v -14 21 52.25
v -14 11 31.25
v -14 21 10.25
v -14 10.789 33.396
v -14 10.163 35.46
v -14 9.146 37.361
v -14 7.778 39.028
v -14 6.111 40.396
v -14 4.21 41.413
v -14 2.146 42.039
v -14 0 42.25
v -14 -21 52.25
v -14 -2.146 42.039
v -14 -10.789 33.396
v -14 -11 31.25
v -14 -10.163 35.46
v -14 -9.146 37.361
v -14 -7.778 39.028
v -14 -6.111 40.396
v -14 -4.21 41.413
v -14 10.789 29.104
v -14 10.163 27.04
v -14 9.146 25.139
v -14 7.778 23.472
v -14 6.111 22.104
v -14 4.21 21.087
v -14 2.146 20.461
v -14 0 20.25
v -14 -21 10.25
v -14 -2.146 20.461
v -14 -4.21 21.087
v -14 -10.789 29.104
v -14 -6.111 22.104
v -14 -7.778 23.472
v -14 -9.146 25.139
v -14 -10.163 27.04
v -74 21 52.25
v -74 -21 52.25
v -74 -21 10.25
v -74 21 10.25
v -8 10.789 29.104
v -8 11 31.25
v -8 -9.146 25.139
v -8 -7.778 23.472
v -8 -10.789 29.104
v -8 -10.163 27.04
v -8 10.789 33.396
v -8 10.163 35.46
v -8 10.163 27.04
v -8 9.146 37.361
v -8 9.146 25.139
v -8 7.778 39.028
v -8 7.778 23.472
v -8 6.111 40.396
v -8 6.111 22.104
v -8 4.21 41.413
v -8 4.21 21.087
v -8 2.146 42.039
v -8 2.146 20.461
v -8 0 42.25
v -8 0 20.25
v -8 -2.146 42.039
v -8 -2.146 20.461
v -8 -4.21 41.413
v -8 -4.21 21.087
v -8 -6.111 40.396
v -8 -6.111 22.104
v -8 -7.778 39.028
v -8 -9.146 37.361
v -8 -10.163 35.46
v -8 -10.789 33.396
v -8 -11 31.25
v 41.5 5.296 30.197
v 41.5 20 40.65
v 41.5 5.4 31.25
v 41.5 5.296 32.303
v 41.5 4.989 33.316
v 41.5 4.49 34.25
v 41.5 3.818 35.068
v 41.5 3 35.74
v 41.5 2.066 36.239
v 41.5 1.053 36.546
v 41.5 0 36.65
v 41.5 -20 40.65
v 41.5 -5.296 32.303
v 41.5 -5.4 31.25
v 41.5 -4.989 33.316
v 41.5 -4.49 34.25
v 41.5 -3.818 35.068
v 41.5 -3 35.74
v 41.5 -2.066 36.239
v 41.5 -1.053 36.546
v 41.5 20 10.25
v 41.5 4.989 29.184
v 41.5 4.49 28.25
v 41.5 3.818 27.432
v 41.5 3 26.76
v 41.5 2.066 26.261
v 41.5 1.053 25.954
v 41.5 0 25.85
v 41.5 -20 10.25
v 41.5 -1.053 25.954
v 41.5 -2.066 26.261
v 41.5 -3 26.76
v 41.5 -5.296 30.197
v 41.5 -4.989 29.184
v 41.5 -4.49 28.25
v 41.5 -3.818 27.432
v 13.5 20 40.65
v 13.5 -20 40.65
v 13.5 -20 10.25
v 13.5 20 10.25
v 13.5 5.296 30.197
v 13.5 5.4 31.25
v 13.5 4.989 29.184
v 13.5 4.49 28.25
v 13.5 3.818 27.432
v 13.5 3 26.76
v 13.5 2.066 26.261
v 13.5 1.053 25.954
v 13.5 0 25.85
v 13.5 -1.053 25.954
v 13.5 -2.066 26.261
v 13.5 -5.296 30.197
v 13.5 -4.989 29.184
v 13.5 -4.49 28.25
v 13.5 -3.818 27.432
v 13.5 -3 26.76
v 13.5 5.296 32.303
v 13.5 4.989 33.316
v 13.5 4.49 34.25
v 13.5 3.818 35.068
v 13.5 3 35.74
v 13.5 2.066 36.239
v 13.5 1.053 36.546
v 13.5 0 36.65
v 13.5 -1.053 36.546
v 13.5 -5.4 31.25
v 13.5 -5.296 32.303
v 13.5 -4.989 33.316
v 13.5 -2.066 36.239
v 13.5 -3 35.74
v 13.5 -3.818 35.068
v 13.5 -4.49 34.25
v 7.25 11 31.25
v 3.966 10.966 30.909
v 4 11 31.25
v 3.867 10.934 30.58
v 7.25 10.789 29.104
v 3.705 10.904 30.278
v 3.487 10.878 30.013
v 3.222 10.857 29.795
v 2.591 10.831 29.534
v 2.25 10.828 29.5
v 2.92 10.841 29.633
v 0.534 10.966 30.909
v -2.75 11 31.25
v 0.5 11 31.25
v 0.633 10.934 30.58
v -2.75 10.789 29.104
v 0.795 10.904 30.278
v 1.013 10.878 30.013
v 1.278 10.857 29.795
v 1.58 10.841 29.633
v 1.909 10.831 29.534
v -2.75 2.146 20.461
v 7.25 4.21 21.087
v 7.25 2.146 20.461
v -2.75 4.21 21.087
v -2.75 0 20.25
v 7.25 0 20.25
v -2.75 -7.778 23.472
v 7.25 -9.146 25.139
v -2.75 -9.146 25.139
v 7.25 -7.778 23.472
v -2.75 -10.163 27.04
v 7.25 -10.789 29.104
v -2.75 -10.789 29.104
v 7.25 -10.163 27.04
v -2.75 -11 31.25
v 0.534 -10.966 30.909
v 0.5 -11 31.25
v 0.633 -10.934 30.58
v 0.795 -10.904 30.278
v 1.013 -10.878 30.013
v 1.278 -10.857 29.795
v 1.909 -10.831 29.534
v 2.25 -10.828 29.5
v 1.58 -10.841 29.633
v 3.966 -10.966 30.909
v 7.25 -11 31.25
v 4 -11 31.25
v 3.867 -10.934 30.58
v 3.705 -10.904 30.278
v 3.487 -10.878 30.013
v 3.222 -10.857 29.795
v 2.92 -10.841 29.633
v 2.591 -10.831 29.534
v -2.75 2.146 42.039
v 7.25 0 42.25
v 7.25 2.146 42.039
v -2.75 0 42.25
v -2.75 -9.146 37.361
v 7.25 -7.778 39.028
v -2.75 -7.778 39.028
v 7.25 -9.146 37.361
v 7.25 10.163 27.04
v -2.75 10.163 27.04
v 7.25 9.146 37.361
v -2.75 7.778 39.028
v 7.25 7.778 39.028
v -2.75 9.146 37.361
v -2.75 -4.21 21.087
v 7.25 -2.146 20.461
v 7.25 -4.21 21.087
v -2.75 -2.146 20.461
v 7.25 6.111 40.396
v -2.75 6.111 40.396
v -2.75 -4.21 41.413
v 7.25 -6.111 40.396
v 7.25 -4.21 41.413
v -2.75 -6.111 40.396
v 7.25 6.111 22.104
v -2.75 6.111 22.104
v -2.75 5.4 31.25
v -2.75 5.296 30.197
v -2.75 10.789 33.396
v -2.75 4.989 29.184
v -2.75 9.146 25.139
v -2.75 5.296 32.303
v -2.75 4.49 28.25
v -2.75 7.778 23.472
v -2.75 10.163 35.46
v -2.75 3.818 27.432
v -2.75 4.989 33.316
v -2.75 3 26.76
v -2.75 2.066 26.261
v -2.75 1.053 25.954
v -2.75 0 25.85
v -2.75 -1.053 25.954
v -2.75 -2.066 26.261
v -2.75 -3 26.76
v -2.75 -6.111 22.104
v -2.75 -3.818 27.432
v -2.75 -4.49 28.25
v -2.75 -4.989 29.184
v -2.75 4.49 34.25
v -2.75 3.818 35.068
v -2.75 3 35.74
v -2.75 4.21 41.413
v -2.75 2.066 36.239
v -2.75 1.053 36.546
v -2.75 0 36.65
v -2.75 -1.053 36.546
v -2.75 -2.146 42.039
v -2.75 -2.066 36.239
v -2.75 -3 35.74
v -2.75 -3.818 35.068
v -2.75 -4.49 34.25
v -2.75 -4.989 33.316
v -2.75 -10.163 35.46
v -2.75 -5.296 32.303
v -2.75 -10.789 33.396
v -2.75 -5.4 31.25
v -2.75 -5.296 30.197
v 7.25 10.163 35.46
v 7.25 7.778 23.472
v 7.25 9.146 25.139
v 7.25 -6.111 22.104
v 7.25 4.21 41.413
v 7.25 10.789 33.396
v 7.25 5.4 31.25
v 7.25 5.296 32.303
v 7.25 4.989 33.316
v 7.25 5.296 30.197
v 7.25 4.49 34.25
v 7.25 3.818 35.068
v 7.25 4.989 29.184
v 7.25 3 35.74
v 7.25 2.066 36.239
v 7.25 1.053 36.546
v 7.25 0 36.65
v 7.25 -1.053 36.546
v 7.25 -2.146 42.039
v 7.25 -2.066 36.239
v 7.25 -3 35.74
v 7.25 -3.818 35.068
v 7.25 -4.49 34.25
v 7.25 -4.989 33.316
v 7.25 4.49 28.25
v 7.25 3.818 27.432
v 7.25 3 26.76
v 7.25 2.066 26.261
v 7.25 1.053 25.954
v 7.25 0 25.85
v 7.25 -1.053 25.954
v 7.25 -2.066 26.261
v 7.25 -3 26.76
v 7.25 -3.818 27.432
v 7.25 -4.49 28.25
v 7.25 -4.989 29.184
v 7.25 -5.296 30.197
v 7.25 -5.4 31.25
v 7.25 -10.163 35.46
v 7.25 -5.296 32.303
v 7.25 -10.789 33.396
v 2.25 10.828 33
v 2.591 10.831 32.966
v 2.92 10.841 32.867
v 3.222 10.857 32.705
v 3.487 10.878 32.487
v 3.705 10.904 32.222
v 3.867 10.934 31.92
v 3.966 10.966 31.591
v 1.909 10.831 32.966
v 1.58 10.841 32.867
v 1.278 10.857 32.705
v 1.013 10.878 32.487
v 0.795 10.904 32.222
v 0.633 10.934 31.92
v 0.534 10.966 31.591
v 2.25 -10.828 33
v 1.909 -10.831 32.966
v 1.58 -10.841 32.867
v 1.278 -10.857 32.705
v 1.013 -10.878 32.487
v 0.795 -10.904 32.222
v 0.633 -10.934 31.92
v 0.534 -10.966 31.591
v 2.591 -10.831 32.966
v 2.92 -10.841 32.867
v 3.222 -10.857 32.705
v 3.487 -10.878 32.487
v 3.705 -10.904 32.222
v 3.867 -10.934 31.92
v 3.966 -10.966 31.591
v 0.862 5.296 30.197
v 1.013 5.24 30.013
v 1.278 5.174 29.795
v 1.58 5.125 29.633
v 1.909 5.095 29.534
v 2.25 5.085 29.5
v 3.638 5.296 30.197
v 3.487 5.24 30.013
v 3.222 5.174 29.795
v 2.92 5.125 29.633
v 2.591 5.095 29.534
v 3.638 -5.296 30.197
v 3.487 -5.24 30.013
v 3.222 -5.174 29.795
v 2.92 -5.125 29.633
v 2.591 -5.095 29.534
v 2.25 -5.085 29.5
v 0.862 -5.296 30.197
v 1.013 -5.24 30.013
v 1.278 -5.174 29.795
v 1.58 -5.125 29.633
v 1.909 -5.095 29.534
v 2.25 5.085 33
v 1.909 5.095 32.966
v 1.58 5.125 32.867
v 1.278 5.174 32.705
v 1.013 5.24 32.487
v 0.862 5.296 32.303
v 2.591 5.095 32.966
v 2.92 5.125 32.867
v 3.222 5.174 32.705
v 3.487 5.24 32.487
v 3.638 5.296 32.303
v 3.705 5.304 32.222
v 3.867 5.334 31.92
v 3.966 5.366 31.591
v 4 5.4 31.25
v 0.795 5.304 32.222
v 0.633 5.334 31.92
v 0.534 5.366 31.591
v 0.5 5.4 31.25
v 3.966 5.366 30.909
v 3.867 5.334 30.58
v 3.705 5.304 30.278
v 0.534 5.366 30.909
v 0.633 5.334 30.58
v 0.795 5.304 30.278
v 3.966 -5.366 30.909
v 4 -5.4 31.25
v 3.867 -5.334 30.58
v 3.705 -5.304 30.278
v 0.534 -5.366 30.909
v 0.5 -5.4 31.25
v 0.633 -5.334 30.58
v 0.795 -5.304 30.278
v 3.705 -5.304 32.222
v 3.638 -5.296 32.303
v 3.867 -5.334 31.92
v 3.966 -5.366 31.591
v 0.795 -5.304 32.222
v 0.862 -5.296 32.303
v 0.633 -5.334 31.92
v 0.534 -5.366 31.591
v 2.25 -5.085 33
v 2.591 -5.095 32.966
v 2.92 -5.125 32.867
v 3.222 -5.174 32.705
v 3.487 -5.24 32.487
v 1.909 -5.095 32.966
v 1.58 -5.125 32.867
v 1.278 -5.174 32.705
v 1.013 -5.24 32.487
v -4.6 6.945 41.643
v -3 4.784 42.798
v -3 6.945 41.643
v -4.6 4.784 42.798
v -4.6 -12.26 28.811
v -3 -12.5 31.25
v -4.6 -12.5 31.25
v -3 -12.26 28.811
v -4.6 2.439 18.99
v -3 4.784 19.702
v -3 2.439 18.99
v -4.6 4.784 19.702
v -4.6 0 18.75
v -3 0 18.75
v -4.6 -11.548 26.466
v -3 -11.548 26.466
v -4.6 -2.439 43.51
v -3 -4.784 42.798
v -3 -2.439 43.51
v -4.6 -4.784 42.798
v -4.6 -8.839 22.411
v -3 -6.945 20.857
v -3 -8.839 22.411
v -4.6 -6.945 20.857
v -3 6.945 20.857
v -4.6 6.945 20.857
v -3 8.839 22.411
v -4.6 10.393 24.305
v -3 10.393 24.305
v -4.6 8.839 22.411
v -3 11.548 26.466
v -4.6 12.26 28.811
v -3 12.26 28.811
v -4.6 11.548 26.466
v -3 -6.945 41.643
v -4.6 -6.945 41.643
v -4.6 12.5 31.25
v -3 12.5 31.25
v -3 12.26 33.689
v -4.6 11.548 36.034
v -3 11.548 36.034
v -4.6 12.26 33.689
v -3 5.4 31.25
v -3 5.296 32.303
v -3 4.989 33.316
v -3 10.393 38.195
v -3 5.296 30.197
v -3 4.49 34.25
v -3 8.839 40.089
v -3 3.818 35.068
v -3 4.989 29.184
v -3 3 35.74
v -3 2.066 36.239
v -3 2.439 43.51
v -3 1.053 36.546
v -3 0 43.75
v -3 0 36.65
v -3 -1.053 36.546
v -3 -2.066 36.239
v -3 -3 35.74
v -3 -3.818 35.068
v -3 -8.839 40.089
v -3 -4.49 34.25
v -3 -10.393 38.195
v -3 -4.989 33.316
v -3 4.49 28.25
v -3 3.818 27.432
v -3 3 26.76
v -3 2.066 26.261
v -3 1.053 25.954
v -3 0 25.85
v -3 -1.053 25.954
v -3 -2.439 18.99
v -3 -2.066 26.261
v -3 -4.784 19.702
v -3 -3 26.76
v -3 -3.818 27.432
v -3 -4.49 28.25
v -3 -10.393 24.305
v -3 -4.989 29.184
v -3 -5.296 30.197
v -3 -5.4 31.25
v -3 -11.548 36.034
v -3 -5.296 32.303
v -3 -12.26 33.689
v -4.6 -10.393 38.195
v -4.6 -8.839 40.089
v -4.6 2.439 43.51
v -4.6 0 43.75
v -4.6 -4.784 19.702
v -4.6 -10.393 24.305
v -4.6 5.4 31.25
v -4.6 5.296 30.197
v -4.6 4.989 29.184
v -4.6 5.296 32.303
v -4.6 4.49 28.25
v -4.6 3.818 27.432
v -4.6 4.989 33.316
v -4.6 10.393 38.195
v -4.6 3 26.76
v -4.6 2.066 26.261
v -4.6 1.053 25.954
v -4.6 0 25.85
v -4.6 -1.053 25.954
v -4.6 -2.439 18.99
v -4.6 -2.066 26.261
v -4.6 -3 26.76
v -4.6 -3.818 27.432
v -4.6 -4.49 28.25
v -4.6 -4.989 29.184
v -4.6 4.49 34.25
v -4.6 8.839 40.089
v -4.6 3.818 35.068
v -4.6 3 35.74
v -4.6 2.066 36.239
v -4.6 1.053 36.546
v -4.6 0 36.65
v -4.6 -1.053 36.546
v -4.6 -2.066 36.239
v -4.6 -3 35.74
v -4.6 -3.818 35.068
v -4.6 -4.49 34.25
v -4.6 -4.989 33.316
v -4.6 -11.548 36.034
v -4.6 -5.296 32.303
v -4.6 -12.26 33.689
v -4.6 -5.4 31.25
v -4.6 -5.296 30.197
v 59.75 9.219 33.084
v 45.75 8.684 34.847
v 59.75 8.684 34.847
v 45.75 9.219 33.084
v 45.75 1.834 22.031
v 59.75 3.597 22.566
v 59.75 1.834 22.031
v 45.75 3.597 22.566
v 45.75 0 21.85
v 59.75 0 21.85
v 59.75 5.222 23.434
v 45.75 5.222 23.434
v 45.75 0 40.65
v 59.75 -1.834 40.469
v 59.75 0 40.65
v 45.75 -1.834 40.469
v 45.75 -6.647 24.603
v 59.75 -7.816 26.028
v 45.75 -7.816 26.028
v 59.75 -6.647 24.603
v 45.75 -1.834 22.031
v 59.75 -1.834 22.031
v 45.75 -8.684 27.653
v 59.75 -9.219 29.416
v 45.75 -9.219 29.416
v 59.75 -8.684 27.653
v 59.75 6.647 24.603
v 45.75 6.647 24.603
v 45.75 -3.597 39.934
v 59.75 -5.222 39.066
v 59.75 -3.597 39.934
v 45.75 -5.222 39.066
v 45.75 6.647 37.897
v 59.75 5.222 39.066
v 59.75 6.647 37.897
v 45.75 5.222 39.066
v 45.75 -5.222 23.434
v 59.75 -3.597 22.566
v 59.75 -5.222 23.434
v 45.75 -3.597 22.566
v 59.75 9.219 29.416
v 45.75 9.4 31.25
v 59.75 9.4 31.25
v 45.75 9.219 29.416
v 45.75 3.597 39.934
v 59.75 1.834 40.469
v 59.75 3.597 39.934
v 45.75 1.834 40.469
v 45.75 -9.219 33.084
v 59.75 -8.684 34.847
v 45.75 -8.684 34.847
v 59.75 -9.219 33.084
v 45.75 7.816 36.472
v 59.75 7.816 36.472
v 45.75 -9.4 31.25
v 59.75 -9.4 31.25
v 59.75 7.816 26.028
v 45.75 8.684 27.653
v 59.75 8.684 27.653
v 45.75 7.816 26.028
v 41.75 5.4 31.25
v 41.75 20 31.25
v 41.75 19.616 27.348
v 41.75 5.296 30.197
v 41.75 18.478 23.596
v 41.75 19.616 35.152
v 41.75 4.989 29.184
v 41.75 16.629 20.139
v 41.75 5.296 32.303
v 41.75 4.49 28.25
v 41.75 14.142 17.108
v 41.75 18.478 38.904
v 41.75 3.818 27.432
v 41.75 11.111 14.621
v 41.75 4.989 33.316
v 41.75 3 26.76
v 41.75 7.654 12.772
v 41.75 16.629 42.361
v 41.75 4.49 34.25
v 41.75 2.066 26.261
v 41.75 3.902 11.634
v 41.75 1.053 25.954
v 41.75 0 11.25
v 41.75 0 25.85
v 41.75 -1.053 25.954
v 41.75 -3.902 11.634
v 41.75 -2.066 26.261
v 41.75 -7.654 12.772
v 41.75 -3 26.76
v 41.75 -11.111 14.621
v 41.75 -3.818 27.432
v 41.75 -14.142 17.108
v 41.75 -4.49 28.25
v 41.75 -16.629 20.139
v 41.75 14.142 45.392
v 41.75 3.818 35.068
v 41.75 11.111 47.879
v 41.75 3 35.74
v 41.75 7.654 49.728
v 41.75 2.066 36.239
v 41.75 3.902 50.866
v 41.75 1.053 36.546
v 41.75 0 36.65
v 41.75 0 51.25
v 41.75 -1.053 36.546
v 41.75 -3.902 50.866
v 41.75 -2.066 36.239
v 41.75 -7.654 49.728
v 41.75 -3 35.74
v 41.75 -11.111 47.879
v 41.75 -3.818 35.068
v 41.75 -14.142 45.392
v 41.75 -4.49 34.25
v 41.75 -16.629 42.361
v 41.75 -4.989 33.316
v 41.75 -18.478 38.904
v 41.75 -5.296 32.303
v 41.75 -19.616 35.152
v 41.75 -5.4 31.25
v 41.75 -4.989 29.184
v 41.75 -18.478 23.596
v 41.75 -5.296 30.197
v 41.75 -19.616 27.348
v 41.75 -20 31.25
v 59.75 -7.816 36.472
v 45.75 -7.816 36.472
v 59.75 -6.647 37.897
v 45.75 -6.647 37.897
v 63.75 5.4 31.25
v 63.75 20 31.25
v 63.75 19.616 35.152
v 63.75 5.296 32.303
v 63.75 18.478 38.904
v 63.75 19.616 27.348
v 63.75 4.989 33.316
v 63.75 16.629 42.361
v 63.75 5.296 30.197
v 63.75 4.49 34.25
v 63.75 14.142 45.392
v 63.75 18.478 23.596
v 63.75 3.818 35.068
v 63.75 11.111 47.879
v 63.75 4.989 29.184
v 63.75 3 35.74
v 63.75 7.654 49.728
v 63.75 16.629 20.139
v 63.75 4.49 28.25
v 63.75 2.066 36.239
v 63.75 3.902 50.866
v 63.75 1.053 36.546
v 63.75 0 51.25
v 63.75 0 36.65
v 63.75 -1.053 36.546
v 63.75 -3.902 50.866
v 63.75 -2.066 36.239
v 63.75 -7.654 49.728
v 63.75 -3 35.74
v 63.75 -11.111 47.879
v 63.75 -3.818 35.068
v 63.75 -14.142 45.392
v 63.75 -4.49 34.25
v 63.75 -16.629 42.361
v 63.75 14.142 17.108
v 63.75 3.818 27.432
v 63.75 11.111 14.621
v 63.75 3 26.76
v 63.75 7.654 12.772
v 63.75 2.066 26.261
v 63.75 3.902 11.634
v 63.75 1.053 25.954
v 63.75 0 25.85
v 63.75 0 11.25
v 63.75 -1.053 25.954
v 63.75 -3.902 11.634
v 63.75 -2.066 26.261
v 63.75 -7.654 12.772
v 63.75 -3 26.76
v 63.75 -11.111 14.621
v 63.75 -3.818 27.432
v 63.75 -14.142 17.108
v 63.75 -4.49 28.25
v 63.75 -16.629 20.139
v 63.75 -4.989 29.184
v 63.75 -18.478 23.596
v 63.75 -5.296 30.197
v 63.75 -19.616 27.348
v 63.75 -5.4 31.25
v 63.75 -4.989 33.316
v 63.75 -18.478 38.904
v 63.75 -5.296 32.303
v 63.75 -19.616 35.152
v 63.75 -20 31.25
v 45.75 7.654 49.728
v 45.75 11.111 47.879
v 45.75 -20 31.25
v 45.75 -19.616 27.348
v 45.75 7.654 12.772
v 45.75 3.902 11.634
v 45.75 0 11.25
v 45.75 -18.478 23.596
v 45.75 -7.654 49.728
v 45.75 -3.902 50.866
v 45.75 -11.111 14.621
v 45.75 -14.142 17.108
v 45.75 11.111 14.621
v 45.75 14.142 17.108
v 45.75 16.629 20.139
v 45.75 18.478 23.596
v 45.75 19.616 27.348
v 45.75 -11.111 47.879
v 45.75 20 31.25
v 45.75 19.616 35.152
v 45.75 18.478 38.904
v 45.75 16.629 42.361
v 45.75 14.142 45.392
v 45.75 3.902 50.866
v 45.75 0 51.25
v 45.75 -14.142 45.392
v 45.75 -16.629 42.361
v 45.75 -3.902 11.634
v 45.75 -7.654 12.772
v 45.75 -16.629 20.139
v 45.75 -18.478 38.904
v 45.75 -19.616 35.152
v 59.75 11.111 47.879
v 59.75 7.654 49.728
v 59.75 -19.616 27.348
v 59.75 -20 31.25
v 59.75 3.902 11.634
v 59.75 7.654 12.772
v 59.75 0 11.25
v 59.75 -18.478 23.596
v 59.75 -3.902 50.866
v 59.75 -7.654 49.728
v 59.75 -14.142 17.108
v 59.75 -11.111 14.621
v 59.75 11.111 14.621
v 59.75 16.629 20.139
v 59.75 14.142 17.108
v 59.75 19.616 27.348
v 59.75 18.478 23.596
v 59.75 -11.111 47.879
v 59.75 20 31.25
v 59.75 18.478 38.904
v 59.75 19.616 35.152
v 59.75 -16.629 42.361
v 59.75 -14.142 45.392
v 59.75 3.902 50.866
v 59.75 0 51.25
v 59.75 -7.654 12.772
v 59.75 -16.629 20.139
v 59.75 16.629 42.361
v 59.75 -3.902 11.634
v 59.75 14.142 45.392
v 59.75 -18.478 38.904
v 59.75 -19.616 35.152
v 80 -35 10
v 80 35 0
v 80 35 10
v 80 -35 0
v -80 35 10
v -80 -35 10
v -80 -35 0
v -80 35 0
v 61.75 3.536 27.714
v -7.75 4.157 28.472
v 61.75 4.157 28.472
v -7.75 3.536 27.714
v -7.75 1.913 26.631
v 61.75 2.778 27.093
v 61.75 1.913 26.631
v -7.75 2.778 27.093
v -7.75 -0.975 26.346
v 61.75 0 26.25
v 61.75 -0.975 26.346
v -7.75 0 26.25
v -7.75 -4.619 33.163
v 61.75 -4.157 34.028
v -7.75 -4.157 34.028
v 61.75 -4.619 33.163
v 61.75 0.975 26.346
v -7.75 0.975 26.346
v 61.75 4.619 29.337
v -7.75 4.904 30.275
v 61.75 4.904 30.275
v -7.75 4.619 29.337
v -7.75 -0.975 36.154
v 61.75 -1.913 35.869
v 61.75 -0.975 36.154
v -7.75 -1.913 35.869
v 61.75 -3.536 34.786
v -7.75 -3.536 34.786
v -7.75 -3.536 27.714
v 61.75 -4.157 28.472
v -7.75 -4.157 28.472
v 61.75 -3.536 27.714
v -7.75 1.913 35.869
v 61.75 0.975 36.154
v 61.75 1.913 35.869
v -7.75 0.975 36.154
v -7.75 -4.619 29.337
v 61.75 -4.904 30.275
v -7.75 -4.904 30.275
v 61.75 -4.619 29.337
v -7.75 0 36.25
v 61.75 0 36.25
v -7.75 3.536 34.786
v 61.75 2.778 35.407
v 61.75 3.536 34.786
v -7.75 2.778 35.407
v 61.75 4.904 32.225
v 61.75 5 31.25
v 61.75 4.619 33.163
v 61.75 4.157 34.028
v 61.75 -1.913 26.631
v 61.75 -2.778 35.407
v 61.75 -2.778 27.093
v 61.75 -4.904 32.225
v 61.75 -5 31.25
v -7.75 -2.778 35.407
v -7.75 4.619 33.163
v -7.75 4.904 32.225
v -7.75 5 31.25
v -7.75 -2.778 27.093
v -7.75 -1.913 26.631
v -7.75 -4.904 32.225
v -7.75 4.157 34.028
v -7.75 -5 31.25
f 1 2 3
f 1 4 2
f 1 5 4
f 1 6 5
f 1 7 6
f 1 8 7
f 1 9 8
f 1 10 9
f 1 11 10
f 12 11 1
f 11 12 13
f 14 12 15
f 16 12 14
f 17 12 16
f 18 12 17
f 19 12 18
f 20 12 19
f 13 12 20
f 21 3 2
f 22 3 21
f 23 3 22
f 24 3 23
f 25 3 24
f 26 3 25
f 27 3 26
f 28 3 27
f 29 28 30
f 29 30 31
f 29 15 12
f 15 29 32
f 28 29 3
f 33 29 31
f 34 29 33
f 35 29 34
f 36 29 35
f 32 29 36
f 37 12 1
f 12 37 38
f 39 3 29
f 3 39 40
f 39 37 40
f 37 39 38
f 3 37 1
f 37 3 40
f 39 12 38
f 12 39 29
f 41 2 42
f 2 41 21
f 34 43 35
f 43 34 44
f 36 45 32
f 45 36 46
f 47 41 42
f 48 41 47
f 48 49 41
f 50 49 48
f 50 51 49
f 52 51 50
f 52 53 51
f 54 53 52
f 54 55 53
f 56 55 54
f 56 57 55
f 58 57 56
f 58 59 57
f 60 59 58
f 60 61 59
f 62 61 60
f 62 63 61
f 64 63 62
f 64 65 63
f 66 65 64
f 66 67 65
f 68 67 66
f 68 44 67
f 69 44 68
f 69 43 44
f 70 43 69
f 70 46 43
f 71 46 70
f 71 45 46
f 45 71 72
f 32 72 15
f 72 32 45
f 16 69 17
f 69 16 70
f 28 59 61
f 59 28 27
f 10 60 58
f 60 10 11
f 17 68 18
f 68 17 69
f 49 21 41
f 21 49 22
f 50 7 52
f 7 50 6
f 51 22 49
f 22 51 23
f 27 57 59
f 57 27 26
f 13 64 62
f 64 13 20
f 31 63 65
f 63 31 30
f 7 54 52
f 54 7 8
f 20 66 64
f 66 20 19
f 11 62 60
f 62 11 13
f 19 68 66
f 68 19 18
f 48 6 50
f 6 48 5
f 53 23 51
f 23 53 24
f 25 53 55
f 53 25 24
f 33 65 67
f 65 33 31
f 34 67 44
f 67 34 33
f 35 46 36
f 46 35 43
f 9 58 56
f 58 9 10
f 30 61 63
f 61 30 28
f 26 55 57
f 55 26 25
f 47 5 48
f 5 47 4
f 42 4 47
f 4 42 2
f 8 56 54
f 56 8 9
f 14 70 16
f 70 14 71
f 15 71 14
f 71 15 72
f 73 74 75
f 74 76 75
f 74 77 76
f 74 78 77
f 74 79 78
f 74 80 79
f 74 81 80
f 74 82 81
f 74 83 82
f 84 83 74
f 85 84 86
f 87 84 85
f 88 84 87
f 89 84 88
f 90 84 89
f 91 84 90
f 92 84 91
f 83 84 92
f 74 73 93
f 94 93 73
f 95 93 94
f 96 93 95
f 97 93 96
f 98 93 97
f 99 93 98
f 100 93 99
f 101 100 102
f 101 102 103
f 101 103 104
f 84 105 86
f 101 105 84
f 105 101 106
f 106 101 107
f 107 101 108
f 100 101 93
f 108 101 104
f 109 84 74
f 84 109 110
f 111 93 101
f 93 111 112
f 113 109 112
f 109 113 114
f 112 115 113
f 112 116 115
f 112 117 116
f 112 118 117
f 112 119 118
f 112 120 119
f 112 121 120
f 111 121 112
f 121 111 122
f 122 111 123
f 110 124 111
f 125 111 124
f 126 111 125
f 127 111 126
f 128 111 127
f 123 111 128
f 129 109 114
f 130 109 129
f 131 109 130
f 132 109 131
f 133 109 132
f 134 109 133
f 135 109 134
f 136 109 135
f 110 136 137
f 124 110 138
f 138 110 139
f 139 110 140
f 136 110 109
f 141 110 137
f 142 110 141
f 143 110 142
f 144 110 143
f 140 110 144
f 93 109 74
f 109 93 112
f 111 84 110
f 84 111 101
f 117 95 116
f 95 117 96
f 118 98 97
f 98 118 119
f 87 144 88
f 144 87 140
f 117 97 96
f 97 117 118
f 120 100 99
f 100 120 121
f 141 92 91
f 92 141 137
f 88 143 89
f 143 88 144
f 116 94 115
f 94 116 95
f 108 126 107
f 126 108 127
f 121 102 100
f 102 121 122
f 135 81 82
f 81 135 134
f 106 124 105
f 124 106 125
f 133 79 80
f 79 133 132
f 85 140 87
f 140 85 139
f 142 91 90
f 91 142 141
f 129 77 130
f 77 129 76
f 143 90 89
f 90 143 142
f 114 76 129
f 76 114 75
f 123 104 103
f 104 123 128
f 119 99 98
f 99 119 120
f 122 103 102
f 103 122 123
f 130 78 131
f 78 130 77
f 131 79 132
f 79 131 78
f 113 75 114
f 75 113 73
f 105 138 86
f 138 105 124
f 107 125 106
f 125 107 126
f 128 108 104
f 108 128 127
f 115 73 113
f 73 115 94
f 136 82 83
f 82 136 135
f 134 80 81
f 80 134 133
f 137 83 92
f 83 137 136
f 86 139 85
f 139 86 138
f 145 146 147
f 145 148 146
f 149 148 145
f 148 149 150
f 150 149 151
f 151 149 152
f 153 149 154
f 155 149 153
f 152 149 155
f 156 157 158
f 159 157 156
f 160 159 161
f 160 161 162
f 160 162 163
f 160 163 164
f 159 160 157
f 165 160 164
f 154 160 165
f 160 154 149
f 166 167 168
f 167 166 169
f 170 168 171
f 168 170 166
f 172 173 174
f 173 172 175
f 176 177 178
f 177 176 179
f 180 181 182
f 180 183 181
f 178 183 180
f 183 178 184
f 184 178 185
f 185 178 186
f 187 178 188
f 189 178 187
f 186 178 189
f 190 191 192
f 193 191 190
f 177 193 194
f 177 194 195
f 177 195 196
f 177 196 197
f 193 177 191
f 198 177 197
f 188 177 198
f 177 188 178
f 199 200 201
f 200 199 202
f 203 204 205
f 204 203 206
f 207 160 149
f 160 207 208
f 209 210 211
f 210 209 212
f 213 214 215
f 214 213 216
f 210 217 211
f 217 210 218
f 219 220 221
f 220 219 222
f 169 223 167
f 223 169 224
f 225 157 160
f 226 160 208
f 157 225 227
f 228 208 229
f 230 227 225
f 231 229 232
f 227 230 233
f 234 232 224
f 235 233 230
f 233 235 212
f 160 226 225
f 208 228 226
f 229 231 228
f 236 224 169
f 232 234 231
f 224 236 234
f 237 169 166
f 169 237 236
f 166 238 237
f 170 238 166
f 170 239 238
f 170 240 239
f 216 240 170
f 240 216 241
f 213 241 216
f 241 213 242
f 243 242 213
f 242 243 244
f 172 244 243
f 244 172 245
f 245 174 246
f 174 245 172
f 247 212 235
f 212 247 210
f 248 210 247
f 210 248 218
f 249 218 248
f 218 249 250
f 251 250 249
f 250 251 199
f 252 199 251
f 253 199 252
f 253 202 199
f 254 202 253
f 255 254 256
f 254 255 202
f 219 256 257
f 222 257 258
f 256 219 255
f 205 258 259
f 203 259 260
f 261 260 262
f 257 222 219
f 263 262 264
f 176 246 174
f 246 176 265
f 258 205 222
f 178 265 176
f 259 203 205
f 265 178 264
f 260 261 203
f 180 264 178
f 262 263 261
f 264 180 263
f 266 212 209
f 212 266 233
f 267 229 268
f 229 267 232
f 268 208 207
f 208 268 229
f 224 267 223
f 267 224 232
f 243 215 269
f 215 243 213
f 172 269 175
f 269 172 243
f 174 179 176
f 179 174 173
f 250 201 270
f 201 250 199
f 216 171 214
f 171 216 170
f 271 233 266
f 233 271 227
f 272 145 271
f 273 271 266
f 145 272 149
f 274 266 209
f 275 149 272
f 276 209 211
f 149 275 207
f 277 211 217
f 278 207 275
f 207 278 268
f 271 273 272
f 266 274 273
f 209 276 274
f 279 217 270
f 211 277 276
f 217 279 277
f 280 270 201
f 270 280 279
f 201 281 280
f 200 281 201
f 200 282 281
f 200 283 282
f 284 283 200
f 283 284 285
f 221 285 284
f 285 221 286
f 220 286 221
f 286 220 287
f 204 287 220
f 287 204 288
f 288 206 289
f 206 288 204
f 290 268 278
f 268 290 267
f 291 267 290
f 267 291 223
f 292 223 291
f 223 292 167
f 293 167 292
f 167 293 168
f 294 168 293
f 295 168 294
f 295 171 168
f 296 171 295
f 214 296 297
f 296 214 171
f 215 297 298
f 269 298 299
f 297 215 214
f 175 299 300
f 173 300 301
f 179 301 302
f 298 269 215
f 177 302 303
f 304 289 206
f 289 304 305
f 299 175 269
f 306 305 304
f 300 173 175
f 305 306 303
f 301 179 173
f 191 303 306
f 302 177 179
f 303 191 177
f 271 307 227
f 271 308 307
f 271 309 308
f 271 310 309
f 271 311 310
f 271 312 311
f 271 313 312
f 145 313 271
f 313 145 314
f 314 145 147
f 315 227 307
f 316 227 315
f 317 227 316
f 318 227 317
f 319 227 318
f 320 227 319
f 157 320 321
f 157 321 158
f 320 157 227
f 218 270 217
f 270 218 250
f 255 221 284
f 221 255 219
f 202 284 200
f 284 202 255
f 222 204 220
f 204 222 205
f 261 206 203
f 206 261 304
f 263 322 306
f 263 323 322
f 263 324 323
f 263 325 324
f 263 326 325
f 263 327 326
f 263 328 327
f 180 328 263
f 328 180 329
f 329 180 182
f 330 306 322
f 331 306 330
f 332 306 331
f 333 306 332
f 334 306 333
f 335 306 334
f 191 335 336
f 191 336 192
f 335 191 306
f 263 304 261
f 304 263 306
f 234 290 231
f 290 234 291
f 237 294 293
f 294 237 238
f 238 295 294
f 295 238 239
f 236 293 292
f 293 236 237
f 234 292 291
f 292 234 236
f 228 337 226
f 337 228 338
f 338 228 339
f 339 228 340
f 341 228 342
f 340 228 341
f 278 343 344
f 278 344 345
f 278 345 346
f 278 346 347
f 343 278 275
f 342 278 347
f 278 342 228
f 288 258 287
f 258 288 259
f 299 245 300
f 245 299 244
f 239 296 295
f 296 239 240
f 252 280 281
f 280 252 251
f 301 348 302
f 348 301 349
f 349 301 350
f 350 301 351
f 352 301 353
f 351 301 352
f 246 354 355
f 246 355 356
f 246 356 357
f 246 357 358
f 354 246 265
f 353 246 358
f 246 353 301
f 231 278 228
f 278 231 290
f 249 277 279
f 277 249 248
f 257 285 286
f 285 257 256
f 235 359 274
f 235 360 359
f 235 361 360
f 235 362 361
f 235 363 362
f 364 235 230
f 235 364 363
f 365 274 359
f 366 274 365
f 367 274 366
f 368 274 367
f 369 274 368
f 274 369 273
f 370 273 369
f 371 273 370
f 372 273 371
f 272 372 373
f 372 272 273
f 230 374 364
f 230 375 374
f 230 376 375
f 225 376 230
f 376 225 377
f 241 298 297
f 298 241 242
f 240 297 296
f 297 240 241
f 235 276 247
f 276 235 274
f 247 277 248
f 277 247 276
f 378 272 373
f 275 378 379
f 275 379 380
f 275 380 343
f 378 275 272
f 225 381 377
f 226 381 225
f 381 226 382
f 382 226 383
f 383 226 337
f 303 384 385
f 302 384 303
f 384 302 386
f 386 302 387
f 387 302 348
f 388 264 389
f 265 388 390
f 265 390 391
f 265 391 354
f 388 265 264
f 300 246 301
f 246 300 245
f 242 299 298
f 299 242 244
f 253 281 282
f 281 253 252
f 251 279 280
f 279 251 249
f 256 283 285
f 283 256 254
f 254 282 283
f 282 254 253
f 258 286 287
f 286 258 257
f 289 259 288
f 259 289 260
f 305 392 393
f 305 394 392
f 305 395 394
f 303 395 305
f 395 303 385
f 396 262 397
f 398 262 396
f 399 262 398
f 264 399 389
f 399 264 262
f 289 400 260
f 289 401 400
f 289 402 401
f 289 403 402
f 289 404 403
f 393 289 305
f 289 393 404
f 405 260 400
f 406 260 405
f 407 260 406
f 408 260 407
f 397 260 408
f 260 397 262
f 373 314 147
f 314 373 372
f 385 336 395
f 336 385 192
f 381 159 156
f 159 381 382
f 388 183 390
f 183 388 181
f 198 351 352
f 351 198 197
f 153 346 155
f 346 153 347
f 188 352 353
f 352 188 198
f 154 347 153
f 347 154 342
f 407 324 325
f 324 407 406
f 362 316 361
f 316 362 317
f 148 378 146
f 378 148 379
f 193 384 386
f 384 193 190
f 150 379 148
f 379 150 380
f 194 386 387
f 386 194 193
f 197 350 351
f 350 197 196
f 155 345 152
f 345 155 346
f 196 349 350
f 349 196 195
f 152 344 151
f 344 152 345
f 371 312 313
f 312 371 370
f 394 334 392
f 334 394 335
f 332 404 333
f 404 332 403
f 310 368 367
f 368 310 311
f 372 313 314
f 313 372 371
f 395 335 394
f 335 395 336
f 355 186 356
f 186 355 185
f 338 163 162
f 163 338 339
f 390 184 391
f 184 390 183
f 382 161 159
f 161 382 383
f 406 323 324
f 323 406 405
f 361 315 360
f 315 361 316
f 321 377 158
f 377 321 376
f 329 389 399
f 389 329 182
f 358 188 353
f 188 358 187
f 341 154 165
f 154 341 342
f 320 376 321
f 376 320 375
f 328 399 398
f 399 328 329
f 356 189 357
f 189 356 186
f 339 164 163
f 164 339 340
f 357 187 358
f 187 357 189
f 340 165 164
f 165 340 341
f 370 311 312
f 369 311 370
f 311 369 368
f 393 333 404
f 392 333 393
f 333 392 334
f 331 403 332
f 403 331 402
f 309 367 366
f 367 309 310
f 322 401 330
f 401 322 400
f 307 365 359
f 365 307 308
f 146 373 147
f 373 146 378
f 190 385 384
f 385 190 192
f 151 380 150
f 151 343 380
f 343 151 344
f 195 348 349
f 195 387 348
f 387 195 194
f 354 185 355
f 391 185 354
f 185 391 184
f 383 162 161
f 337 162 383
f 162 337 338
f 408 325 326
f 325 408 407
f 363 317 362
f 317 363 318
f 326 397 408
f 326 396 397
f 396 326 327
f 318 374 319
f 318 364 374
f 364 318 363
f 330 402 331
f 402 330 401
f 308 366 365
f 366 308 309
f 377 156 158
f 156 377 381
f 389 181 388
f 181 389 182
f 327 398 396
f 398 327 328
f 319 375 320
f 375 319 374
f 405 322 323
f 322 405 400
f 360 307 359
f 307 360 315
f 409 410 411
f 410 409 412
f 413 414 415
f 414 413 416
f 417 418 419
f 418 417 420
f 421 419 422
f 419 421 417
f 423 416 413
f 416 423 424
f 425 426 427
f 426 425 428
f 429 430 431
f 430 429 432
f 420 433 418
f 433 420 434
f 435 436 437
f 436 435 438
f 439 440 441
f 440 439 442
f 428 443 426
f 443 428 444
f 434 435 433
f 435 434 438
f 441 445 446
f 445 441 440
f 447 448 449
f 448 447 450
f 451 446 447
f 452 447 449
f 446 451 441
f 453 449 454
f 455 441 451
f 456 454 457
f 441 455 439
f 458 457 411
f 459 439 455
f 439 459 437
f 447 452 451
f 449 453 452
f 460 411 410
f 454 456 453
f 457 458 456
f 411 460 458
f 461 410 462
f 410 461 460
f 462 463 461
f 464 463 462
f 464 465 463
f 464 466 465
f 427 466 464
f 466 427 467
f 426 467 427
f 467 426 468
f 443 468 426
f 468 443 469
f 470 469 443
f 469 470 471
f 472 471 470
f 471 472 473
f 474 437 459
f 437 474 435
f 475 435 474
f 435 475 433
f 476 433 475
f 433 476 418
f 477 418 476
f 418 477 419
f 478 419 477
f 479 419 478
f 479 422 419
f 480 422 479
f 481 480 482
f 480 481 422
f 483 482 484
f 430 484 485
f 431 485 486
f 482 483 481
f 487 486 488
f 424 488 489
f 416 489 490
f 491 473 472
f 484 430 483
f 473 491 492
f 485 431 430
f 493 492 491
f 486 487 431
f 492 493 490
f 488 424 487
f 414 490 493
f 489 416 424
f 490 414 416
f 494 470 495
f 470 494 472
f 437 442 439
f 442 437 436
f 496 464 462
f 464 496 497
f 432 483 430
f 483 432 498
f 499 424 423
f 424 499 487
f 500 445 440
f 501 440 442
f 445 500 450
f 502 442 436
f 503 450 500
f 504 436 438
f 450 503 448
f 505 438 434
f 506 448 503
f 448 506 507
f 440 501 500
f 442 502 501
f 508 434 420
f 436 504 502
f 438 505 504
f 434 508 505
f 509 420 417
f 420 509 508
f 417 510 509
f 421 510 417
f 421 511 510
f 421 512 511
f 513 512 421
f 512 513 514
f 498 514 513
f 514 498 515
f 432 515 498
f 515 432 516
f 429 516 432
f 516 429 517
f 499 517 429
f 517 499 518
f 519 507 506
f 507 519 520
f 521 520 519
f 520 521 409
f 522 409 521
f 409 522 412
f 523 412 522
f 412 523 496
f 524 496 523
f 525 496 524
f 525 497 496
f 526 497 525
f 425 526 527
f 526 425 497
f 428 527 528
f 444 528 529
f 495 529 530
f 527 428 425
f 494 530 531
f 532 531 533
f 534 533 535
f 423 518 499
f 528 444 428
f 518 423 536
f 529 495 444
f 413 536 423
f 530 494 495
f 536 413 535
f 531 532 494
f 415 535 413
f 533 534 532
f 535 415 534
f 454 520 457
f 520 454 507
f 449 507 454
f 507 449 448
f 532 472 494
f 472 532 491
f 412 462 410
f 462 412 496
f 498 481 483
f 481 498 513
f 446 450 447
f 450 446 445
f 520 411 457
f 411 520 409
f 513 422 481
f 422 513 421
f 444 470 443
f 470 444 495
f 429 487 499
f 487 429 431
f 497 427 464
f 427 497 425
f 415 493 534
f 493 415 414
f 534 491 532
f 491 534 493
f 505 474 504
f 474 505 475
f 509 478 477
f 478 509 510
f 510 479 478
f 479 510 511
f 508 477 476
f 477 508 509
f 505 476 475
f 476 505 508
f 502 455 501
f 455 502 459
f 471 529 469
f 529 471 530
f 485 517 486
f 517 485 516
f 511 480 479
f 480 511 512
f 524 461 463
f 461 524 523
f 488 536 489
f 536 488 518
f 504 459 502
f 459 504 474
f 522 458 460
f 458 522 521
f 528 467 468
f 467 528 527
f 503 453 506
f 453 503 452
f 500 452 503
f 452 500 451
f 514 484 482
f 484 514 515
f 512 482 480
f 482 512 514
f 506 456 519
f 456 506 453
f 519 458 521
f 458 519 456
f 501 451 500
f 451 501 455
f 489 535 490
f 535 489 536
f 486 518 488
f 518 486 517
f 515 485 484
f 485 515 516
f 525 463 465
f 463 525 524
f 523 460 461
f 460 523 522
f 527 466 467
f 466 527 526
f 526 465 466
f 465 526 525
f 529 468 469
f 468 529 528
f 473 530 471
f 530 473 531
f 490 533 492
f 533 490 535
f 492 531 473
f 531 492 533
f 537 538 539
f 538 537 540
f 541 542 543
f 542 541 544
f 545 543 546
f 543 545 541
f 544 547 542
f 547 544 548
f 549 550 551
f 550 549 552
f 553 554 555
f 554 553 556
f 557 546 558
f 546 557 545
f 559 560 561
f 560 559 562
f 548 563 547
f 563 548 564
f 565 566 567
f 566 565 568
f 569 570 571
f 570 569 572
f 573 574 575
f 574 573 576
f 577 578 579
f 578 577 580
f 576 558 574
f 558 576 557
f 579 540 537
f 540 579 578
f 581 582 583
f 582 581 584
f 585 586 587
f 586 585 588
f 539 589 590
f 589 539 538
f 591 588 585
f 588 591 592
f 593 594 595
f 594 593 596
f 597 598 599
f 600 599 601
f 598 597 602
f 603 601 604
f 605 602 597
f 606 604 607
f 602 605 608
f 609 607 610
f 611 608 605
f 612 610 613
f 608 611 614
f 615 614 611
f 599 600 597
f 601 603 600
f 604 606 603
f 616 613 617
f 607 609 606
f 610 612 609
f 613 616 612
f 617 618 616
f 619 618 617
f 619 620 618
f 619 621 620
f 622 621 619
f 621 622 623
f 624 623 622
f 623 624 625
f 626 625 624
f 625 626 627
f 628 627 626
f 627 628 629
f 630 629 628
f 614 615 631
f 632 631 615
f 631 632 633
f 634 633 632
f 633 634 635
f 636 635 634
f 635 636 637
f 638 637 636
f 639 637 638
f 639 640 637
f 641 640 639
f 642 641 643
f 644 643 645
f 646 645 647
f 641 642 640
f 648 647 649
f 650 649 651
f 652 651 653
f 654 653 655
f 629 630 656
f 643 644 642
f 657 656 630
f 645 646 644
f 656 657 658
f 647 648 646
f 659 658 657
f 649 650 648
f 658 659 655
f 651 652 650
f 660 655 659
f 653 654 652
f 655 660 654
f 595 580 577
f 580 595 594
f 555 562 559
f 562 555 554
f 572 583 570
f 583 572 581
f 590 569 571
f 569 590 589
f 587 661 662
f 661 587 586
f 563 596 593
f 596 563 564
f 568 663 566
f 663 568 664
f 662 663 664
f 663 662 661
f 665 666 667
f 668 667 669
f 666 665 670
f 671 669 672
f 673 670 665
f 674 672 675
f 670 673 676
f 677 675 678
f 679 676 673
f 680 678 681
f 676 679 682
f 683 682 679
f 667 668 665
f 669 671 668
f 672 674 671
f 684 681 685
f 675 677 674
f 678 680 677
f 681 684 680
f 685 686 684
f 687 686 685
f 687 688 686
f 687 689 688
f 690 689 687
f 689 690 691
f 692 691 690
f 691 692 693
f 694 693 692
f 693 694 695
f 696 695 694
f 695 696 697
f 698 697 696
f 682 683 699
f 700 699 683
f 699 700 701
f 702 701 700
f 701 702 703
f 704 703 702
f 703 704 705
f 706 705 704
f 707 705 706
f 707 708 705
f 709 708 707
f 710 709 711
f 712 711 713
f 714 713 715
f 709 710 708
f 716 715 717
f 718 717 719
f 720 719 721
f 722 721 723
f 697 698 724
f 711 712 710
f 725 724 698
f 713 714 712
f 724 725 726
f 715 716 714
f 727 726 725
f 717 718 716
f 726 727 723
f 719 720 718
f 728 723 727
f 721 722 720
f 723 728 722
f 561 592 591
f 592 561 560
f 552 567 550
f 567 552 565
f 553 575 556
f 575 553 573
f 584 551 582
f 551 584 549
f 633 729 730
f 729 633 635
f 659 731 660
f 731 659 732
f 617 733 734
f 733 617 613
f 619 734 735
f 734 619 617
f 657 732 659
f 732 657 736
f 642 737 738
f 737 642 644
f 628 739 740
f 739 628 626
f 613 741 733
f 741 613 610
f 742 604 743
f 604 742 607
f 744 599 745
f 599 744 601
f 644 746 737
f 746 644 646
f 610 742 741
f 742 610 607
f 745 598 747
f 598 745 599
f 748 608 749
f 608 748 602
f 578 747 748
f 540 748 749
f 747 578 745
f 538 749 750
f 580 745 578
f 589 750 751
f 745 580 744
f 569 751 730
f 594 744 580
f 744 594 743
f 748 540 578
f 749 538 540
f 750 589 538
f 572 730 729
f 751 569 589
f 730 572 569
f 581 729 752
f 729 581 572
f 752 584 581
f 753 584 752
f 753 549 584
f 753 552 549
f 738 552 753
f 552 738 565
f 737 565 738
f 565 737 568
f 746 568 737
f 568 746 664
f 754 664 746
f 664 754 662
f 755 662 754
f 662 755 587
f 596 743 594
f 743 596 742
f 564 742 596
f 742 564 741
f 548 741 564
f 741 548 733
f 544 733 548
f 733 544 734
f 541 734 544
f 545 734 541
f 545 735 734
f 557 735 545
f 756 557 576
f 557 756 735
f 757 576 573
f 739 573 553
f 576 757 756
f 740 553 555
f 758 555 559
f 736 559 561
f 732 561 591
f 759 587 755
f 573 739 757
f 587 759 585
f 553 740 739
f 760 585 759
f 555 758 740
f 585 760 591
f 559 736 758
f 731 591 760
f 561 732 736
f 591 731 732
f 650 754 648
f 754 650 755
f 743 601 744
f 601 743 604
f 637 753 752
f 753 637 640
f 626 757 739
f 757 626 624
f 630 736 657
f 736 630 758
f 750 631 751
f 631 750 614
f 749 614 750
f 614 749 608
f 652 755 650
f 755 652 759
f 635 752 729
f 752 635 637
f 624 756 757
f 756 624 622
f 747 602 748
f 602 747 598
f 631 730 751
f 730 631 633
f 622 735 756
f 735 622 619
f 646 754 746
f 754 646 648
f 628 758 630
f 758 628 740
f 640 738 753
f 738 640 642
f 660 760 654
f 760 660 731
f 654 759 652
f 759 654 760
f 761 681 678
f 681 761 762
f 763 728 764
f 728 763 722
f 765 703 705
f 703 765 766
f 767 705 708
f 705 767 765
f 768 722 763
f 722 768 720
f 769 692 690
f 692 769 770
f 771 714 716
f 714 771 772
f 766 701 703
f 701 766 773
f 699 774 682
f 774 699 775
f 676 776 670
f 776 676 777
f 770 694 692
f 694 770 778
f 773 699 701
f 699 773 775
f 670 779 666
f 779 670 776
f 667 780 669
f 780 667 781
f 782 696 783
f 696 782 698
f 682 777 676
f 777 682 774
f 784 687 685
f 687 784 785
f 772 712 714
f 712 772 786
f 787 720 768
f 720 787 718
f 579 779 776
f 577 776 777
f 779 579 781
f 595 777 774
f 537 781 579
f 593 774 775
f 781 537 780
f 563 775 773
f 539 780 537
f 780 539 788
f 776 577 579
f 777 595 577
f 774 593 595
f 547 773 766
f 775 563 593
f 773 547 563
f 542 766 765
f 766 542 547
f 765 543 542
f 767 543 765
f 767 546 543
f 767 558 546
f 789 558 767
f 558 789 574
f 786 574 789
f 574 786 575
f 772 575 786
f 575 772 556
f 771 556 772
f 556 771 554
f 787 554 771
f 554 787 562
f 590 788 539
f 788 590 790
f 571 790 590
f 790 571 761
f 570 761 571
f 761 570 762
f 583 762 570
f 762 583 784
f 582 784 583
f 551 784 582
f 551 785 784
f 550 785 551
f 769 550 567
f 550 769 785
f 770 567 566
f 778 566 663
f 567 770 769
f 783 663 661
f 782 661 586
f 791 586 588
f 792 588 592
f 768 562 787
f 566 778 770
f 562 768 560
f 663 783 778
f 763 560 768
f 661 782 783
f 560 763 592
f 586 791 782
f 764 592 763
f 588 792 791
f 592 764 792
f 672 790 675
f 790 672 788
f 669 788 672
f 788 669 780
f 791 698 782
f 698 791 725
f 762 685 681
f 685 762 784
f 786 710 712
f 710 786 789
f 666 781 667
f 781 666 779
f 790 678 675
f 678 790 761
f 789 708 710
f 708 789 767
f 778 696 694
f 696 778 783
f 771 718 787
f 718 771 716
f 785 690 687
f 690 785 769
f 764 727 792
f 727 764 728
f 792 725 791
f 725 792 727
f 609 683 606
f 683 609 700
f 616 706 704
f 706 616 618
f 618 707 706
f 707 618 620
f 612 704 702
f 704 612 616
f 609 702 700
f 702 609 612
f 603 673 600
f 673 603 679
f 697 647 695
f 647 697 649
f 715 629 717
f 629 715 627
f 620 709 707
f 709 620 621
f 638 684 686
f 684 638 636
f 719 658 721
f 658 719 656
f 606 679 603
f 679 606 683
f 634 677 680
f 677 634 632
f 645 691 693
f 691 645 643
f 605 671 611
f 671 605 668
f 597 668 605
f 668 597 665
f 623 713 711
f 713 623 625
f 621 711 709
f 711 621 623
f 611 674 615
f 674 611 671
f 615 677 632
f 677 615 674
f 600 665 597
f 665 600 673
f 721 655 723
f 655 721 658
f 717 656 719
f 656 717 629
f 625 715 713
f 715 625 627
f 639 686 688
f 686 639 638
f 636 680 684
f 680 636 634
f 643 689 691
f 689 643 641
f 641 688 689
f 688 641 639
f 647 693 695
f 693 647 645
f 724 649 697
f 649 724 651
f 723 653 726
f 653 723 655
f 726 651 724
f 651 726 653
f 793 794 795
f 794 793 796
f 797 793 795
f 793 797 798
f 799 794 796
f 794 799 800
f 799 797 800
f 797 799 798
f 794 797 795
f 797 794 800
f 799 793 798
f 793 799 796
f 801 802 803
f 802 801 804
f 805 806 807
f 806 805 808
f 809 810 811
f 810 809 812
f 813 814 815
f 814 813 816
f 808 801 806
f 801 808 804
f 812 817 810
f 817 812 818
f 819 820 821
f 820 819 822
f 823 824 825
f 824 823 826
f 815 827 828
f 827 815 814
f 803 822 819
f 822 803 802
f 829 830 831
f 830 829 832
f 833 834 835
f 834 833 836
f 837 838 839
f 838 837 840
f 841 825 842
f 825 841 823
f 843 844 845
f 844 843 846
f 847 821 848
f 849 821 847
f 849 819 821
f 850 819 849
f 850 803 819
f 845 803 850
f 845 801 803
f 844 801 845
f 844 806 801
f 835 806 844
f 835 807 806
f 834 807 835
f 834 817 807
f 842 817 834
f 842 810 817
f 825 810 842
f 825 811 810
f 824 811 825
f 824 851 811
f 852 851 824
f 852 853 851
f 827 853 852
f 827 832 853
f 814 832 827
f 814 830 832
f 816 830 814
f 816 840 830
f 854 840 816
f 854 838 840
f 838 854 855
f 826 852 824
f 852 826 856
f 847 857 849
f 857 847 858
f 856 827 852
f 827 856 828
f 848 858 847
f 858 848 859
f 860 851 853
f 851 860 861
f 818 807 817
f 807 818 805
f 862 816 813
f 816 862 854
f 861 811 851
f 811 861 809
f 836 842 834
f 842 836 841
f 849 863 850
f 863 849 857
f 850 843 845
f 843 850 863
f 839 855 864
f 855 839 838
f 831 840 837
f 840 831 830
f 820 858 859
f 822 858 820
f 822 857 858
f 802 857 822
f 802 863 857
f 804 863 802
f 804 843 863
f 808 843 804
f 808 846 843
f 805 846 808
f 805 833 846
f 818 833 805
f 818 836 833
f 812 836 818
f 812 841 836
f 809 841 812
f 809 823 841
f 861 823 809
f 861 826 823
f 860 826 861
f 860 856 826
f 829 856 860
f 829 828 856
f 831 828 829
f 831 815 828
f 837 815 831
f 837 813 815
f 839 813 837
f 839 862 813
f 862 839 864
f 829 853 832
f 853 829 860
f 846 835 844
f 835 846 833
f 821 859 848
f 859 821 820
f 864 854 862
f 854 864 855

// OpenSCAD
$fn = 32;

// ------------------------------------------------------------------------
// Motor drive station: motor 60 x 42 mm, shaft d10, pulley d40
// Every part is its own module, assembly() places every instance.
// ------------------------------------------------------------------------

// --- part 1 ---
module station_bed() {
  difference() {
    translate([-80, -35, 0]) cube([160, 70, 10]);
  }
}

// --- part 2 ---
module drive_motor() {
  union() {
    translate([-30, -21, 0]) cube([60, 42, 42]);
    translate([33, 0, 21]) rotate([0, 90, 0]) cylinder(h = 6, d = 22, center = true);
  }
}

// --- part 3 ---
module pillow_block() {
  difference() {
    translate([-14, -20, 0]) cube([28, 40, 30.4]);
    translate([0, 0, 21]) rotate([0, 90, 0]) cylinder(h = 30, d = 10.8, center = true);
  }
}

// --- part 4 ---
module drive_shaft() {
  translate([0, 0, -34.75]) cylinder(h = 69.5, d = 10);
}

// --- part 5 ---
module shaft_collar() {
  difference() {
    cylinder(h = 10, d = 22);
    translate([0, 0, -1]) cylinder(h = 12, d = 10.8);
    translate([0, 0, 5]) rotate([90, 0, 0]) cylinder(h = 24, d = 3.5, center = true);
  }
}

// --- part 6 ---
module collar_washer() {
  difference() {
      translate([0, 0, 0]) cylinder(h = 1.6, d = 25);
      translate([0, 0, -1]) cylinder(h = 3.6, d = 10.8);
    }
}

// --- part 7 ---
module drive_pulley() {
  difference() {
    union() {
      cylinder(h = 22, d = 18.8);
      cylinder(h = 4, d = 40);
      translate([0, 0, 18]) cylinder(h = 4, d = 40);
    }
    translate([0, 0, -1]) cylinder(h = 24, d = 10.8);
  }
}

// --- assembly ---
module assembly() {
  color([0.80, 0.24, 0.20]) translate([0, 0, 0]) rotate([0, 0, 0]) station_bed();
  color([0.20, 0.45, 0.75]) translate([-44, 0, 10.25]) rotate([0, 0, 0]) drive_motor();
  color([0.25, 0.62, 0.32]) translate([27.5, 0, 10.25]) rotate([0, 0, 0]) pillow_block();
  color([0.92, 0.70, 0.18]) translate([27, 0, 31.25]) rotate([0, 90, 0]) drive_shaft();
  color([0.58, 0.35, 0.70]) translate([-2.75, 0, 31.25]) rotate([0, 90, 0]) shaft_collar();
  color([0.16, 0.66, 0.66]) translate([-4.6, 0, 31.25]) rotate([0, 90, 0]) collar_washer();
  color([0.85, 0.48, 0.18]) translate([41.75, 0, 31.25]) rotate([0, 90, 0]) drive_pulley();
}

assembly();
